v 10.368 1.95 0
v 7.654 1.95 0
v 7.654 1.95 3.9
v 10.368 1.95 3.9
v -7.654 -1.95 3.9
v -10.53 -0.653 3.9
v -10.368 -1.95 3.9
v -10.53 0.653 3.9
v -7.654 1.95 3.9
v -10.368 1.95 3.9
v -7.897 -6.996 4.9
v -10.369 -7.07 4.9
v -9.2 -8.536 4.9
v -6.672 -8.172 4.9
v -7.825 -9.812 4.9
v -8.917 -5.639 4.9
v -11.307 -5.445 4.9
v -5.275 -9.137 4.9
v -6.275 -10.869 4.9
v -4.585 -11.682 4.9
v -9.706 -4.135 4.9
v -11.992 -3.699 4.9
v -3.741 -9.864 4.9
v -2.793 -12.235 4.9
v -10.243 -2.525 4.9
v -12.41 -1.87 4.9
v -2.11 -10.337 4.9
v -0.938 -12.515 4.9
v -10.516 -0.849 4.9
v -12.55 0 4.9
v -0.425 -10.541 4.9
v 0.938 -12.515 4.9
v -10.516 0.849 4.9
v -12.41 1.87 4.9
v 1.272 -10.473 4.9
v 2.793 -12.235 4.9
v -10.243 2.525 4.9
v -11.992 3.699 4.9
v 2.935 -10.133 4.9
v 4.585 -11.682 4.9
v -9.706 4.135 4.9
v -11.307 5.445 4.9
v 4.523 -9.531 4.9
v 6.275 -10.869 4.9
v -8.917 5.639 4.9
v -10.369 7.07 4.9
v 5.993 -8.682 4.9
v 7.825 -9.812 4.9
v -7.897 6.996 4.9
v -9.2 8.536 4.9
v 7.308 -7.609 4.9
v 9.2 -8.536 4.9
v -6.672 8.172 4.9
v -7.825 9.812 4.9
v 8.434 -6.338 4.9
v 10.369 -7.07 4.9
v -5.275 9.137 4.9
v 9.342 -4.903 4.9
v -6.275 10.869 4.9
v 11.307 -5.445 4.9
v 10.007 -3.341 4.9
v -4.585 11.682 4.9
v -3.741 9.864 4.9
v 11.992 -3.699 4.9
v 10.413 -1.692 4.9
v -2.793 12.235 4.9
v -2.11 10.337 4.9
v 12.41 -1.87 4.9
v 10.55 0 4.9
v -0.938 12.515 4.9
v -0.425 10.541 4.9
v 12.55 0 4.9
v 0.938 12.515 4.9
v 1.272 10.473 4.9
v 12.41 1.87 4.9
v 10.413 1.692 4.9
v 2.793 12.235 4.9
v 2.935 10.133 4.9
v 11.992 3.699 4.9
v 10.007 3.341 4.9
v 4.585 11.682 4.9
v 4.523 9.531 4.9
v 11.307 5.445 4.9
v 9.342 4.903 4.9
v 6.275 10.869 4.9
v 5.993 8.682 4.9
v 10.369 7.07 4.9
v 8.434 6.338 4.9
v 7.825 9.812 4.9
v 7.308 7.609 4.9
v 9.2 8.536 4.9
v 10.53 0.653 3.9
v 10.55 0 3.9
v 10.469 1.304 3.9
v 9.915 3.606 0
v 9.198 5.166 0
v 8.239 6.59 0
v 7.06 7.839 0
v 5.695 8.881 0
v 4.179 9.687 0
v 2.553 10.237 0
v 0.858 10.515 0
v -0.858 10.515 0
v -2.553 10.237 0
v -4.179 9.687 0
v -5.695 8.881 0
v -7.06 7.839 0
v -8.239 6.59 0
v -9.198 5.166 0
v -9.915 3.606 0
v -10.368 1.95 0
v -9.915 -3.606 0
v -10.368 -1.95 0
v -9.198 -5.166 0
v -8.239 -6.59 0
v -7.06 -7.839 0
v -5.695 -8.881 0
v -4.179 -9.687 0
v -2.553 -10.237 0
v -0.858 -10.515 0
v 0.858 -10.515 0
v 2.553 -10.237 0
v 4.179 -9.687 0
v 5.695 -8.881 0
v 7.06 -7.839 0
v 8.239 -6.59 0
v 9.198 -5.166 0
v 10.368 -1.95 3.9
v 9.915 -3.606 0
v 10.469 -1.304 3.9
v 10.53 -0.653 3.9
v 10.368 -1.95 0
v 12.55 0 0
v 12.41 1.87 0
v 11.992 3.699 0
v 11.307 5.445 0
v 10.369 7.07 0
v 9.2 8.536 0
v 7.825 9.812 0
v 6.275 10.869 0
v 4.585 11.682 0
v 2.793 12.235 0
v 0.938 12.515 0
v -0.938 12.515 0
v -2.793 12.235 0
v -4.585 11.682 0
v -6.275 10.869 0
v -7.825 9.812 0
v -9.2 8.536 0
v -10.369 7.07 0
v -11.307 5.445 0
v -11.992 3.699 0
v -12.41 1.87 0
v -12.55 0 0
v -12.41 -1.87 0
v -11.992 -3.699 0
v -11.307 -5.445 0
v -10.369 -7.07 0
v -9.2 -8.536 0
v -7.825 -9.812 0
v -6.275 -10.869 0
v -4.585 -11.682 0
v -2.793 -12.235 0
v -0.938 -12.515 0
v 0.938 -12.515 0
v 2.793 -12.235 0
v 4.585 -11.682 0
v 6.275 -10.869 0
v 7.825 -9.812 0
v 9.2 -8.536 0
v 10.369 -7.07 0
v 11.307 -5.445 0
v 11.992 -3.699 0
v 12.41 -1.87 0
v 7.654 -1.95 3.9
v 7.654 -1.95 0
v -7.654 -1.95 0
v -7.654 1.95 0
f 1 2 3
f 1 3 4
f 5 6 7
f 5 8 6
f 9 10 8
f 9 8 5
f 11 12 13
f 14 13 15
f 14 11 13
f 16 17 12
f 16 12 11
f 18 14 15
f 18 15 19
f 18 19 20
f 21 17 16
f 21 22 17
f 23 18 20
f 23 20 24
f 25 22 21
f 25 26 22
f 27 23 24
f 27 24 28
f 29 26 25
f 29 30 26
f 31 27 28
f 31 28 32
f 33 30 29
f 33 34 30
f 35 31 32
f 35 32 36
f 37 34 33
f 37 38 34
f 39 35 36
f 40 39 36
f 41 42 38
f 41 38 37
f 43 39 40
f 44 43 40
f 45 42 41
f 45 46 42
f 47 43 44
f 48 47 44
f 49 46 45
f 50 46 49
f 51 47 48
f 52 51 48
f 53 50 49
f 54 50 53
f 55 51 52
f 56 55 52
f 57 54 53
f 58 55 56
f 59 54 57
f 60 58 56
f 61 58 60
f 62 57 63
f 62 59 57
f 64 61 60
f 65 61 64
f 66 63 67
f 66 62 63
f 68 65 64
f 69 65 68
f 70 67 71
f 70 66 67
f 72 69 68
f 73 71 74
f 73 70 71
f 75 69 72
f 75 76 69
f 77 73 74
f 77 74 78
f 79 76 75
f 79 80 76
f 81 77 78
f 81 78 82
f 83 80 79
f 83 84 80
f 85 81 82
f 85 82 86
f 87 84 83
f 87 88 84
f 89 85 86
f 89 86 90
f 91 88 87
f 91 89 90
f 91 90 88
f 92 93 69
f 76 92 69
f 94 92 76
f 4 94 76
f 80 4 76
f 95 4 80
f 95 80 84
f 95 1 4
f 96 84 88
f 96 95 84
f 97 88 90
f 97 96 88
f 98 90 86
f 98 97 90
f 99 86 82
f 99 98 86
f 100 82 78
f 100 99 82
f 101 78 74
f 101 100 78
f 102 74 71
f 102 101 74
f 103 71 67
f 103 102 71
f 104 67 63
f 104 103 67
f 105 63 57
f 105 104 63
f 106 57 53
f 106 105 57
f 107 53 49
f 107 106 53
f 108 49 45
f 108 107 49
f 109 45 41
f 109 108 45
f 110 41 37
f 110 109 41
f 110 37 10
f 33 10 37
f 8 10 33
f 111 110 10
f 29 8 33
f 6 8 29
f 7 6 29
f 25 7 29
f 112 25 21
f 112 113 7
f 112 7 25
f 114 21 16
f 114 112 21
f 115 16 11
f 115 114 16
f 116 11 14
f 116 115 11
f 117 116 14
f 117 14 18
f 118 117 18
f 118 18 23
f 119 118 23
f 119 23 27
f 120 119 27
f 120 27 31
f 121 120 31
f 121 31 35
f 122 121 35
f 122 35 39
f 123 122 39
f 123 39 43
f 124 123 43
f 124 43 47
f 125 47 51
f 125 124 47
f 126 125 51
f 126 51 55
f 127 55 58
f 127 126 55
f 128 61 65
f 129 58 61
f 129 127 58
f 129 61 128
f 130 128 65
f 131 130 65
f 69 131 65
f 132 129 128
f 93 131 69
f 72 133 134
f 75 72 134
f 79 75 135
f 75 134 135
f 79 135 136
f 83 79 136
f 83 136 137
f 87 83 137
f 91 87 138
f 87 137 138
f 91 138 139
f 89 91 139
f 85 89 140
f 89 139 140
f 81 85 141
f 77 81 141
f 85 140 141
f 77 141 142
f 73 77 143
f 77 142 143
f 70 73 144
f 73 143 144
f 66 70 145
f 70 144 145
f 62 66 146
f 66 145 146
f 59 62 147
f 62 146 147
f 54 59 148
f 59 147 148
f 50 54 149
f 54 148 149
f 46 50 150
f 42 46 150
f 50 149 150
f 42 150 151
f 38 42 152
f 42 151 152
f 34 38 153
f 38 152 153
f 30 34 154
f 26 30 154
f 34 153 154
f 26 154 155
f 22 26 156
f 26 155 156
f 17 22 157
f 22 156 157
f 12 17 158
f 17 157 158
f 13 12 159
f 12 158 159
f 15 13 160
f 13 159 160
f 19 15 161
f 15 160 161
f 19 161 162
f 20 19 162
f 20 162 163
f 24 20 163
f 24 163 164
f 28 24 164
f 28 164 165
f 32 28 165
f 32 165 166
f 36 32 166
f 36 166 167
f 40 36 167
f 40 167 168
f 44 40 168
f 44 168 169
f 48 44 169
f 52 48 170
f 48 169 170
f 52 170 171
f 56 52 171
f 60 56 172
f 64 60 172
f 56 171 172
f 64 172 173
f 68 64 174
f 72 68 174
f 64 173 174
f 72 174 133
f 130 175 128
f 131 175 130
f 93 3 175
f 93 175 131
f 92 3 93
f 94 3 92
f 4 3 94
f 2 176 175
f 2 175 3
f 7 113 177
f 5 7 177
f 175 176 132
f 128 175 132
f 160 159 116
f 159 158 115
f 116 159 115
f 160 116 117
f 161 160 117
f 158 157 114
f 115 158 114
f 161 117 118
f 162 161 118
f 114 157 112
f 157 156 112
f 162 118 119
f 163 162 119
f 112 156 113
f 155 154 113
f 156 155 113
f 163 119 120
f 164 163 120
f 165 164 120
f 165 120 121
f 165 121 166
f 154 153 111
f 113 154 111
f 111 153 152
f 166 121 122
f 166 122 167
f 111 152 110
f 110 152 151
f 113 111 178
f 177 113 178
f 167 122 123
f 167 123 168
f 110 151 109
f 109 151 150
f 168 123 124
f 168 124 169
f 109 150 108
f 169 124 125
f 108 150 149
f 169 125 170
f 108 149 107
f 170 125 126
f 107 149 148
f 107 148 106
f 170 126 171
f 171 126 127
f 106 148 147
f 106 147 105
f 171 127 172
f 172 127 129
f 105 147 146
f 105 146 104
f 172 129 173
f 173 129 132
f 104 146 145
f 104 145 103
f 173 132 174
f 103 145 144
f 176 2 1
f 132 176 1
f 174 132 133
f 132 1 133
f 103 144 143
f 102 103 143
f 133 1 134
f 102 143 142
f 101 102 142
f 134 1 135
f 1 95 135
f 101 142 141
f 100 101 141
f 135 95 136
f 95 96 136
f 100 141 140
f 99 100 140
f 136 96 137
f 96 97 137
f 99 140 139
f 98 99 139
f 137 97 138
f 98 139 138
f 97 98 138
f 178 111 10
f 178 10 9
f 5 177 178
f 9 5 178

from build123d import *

# Parameters (mm, degrees)
SKETCH_1_R      = 12.55
SKETCH_1_R_2    = 10.55
EXTRUDE_1_DEPTH = 4.9
SKETCH_2_W      = 3.555672838
SKETCH_2_H      = 3.9
EXTRUDE_2_DEPTH = 3.9


with BuildPart() as part:
    # 草图1 → 拉伸-薄壁1 (new body)
    with BuildSketch(Plane.XY):
        Circle(SKETCH_1_R)
        Circle(SKETCH_1_R_2, mode=Mode.SUBTRACT)
    extrude(amount=EXTRUDE_1_DEPTH)

    # 草图2 → 凸台-拉伸2 (add)
    with BuildSketch(Plane.XY):
        with Locations((-9.432034927, 0)):
            Rectangle(SKETCH_2_W, SKETCH_2_H)
        with Locations((9.432034927, 0)):
            Rectangle(SKETCH_2_W, SKETCH_2_H)
    extrude(amount=EXTRUDE_2_DEPTH)


solid = part.part
